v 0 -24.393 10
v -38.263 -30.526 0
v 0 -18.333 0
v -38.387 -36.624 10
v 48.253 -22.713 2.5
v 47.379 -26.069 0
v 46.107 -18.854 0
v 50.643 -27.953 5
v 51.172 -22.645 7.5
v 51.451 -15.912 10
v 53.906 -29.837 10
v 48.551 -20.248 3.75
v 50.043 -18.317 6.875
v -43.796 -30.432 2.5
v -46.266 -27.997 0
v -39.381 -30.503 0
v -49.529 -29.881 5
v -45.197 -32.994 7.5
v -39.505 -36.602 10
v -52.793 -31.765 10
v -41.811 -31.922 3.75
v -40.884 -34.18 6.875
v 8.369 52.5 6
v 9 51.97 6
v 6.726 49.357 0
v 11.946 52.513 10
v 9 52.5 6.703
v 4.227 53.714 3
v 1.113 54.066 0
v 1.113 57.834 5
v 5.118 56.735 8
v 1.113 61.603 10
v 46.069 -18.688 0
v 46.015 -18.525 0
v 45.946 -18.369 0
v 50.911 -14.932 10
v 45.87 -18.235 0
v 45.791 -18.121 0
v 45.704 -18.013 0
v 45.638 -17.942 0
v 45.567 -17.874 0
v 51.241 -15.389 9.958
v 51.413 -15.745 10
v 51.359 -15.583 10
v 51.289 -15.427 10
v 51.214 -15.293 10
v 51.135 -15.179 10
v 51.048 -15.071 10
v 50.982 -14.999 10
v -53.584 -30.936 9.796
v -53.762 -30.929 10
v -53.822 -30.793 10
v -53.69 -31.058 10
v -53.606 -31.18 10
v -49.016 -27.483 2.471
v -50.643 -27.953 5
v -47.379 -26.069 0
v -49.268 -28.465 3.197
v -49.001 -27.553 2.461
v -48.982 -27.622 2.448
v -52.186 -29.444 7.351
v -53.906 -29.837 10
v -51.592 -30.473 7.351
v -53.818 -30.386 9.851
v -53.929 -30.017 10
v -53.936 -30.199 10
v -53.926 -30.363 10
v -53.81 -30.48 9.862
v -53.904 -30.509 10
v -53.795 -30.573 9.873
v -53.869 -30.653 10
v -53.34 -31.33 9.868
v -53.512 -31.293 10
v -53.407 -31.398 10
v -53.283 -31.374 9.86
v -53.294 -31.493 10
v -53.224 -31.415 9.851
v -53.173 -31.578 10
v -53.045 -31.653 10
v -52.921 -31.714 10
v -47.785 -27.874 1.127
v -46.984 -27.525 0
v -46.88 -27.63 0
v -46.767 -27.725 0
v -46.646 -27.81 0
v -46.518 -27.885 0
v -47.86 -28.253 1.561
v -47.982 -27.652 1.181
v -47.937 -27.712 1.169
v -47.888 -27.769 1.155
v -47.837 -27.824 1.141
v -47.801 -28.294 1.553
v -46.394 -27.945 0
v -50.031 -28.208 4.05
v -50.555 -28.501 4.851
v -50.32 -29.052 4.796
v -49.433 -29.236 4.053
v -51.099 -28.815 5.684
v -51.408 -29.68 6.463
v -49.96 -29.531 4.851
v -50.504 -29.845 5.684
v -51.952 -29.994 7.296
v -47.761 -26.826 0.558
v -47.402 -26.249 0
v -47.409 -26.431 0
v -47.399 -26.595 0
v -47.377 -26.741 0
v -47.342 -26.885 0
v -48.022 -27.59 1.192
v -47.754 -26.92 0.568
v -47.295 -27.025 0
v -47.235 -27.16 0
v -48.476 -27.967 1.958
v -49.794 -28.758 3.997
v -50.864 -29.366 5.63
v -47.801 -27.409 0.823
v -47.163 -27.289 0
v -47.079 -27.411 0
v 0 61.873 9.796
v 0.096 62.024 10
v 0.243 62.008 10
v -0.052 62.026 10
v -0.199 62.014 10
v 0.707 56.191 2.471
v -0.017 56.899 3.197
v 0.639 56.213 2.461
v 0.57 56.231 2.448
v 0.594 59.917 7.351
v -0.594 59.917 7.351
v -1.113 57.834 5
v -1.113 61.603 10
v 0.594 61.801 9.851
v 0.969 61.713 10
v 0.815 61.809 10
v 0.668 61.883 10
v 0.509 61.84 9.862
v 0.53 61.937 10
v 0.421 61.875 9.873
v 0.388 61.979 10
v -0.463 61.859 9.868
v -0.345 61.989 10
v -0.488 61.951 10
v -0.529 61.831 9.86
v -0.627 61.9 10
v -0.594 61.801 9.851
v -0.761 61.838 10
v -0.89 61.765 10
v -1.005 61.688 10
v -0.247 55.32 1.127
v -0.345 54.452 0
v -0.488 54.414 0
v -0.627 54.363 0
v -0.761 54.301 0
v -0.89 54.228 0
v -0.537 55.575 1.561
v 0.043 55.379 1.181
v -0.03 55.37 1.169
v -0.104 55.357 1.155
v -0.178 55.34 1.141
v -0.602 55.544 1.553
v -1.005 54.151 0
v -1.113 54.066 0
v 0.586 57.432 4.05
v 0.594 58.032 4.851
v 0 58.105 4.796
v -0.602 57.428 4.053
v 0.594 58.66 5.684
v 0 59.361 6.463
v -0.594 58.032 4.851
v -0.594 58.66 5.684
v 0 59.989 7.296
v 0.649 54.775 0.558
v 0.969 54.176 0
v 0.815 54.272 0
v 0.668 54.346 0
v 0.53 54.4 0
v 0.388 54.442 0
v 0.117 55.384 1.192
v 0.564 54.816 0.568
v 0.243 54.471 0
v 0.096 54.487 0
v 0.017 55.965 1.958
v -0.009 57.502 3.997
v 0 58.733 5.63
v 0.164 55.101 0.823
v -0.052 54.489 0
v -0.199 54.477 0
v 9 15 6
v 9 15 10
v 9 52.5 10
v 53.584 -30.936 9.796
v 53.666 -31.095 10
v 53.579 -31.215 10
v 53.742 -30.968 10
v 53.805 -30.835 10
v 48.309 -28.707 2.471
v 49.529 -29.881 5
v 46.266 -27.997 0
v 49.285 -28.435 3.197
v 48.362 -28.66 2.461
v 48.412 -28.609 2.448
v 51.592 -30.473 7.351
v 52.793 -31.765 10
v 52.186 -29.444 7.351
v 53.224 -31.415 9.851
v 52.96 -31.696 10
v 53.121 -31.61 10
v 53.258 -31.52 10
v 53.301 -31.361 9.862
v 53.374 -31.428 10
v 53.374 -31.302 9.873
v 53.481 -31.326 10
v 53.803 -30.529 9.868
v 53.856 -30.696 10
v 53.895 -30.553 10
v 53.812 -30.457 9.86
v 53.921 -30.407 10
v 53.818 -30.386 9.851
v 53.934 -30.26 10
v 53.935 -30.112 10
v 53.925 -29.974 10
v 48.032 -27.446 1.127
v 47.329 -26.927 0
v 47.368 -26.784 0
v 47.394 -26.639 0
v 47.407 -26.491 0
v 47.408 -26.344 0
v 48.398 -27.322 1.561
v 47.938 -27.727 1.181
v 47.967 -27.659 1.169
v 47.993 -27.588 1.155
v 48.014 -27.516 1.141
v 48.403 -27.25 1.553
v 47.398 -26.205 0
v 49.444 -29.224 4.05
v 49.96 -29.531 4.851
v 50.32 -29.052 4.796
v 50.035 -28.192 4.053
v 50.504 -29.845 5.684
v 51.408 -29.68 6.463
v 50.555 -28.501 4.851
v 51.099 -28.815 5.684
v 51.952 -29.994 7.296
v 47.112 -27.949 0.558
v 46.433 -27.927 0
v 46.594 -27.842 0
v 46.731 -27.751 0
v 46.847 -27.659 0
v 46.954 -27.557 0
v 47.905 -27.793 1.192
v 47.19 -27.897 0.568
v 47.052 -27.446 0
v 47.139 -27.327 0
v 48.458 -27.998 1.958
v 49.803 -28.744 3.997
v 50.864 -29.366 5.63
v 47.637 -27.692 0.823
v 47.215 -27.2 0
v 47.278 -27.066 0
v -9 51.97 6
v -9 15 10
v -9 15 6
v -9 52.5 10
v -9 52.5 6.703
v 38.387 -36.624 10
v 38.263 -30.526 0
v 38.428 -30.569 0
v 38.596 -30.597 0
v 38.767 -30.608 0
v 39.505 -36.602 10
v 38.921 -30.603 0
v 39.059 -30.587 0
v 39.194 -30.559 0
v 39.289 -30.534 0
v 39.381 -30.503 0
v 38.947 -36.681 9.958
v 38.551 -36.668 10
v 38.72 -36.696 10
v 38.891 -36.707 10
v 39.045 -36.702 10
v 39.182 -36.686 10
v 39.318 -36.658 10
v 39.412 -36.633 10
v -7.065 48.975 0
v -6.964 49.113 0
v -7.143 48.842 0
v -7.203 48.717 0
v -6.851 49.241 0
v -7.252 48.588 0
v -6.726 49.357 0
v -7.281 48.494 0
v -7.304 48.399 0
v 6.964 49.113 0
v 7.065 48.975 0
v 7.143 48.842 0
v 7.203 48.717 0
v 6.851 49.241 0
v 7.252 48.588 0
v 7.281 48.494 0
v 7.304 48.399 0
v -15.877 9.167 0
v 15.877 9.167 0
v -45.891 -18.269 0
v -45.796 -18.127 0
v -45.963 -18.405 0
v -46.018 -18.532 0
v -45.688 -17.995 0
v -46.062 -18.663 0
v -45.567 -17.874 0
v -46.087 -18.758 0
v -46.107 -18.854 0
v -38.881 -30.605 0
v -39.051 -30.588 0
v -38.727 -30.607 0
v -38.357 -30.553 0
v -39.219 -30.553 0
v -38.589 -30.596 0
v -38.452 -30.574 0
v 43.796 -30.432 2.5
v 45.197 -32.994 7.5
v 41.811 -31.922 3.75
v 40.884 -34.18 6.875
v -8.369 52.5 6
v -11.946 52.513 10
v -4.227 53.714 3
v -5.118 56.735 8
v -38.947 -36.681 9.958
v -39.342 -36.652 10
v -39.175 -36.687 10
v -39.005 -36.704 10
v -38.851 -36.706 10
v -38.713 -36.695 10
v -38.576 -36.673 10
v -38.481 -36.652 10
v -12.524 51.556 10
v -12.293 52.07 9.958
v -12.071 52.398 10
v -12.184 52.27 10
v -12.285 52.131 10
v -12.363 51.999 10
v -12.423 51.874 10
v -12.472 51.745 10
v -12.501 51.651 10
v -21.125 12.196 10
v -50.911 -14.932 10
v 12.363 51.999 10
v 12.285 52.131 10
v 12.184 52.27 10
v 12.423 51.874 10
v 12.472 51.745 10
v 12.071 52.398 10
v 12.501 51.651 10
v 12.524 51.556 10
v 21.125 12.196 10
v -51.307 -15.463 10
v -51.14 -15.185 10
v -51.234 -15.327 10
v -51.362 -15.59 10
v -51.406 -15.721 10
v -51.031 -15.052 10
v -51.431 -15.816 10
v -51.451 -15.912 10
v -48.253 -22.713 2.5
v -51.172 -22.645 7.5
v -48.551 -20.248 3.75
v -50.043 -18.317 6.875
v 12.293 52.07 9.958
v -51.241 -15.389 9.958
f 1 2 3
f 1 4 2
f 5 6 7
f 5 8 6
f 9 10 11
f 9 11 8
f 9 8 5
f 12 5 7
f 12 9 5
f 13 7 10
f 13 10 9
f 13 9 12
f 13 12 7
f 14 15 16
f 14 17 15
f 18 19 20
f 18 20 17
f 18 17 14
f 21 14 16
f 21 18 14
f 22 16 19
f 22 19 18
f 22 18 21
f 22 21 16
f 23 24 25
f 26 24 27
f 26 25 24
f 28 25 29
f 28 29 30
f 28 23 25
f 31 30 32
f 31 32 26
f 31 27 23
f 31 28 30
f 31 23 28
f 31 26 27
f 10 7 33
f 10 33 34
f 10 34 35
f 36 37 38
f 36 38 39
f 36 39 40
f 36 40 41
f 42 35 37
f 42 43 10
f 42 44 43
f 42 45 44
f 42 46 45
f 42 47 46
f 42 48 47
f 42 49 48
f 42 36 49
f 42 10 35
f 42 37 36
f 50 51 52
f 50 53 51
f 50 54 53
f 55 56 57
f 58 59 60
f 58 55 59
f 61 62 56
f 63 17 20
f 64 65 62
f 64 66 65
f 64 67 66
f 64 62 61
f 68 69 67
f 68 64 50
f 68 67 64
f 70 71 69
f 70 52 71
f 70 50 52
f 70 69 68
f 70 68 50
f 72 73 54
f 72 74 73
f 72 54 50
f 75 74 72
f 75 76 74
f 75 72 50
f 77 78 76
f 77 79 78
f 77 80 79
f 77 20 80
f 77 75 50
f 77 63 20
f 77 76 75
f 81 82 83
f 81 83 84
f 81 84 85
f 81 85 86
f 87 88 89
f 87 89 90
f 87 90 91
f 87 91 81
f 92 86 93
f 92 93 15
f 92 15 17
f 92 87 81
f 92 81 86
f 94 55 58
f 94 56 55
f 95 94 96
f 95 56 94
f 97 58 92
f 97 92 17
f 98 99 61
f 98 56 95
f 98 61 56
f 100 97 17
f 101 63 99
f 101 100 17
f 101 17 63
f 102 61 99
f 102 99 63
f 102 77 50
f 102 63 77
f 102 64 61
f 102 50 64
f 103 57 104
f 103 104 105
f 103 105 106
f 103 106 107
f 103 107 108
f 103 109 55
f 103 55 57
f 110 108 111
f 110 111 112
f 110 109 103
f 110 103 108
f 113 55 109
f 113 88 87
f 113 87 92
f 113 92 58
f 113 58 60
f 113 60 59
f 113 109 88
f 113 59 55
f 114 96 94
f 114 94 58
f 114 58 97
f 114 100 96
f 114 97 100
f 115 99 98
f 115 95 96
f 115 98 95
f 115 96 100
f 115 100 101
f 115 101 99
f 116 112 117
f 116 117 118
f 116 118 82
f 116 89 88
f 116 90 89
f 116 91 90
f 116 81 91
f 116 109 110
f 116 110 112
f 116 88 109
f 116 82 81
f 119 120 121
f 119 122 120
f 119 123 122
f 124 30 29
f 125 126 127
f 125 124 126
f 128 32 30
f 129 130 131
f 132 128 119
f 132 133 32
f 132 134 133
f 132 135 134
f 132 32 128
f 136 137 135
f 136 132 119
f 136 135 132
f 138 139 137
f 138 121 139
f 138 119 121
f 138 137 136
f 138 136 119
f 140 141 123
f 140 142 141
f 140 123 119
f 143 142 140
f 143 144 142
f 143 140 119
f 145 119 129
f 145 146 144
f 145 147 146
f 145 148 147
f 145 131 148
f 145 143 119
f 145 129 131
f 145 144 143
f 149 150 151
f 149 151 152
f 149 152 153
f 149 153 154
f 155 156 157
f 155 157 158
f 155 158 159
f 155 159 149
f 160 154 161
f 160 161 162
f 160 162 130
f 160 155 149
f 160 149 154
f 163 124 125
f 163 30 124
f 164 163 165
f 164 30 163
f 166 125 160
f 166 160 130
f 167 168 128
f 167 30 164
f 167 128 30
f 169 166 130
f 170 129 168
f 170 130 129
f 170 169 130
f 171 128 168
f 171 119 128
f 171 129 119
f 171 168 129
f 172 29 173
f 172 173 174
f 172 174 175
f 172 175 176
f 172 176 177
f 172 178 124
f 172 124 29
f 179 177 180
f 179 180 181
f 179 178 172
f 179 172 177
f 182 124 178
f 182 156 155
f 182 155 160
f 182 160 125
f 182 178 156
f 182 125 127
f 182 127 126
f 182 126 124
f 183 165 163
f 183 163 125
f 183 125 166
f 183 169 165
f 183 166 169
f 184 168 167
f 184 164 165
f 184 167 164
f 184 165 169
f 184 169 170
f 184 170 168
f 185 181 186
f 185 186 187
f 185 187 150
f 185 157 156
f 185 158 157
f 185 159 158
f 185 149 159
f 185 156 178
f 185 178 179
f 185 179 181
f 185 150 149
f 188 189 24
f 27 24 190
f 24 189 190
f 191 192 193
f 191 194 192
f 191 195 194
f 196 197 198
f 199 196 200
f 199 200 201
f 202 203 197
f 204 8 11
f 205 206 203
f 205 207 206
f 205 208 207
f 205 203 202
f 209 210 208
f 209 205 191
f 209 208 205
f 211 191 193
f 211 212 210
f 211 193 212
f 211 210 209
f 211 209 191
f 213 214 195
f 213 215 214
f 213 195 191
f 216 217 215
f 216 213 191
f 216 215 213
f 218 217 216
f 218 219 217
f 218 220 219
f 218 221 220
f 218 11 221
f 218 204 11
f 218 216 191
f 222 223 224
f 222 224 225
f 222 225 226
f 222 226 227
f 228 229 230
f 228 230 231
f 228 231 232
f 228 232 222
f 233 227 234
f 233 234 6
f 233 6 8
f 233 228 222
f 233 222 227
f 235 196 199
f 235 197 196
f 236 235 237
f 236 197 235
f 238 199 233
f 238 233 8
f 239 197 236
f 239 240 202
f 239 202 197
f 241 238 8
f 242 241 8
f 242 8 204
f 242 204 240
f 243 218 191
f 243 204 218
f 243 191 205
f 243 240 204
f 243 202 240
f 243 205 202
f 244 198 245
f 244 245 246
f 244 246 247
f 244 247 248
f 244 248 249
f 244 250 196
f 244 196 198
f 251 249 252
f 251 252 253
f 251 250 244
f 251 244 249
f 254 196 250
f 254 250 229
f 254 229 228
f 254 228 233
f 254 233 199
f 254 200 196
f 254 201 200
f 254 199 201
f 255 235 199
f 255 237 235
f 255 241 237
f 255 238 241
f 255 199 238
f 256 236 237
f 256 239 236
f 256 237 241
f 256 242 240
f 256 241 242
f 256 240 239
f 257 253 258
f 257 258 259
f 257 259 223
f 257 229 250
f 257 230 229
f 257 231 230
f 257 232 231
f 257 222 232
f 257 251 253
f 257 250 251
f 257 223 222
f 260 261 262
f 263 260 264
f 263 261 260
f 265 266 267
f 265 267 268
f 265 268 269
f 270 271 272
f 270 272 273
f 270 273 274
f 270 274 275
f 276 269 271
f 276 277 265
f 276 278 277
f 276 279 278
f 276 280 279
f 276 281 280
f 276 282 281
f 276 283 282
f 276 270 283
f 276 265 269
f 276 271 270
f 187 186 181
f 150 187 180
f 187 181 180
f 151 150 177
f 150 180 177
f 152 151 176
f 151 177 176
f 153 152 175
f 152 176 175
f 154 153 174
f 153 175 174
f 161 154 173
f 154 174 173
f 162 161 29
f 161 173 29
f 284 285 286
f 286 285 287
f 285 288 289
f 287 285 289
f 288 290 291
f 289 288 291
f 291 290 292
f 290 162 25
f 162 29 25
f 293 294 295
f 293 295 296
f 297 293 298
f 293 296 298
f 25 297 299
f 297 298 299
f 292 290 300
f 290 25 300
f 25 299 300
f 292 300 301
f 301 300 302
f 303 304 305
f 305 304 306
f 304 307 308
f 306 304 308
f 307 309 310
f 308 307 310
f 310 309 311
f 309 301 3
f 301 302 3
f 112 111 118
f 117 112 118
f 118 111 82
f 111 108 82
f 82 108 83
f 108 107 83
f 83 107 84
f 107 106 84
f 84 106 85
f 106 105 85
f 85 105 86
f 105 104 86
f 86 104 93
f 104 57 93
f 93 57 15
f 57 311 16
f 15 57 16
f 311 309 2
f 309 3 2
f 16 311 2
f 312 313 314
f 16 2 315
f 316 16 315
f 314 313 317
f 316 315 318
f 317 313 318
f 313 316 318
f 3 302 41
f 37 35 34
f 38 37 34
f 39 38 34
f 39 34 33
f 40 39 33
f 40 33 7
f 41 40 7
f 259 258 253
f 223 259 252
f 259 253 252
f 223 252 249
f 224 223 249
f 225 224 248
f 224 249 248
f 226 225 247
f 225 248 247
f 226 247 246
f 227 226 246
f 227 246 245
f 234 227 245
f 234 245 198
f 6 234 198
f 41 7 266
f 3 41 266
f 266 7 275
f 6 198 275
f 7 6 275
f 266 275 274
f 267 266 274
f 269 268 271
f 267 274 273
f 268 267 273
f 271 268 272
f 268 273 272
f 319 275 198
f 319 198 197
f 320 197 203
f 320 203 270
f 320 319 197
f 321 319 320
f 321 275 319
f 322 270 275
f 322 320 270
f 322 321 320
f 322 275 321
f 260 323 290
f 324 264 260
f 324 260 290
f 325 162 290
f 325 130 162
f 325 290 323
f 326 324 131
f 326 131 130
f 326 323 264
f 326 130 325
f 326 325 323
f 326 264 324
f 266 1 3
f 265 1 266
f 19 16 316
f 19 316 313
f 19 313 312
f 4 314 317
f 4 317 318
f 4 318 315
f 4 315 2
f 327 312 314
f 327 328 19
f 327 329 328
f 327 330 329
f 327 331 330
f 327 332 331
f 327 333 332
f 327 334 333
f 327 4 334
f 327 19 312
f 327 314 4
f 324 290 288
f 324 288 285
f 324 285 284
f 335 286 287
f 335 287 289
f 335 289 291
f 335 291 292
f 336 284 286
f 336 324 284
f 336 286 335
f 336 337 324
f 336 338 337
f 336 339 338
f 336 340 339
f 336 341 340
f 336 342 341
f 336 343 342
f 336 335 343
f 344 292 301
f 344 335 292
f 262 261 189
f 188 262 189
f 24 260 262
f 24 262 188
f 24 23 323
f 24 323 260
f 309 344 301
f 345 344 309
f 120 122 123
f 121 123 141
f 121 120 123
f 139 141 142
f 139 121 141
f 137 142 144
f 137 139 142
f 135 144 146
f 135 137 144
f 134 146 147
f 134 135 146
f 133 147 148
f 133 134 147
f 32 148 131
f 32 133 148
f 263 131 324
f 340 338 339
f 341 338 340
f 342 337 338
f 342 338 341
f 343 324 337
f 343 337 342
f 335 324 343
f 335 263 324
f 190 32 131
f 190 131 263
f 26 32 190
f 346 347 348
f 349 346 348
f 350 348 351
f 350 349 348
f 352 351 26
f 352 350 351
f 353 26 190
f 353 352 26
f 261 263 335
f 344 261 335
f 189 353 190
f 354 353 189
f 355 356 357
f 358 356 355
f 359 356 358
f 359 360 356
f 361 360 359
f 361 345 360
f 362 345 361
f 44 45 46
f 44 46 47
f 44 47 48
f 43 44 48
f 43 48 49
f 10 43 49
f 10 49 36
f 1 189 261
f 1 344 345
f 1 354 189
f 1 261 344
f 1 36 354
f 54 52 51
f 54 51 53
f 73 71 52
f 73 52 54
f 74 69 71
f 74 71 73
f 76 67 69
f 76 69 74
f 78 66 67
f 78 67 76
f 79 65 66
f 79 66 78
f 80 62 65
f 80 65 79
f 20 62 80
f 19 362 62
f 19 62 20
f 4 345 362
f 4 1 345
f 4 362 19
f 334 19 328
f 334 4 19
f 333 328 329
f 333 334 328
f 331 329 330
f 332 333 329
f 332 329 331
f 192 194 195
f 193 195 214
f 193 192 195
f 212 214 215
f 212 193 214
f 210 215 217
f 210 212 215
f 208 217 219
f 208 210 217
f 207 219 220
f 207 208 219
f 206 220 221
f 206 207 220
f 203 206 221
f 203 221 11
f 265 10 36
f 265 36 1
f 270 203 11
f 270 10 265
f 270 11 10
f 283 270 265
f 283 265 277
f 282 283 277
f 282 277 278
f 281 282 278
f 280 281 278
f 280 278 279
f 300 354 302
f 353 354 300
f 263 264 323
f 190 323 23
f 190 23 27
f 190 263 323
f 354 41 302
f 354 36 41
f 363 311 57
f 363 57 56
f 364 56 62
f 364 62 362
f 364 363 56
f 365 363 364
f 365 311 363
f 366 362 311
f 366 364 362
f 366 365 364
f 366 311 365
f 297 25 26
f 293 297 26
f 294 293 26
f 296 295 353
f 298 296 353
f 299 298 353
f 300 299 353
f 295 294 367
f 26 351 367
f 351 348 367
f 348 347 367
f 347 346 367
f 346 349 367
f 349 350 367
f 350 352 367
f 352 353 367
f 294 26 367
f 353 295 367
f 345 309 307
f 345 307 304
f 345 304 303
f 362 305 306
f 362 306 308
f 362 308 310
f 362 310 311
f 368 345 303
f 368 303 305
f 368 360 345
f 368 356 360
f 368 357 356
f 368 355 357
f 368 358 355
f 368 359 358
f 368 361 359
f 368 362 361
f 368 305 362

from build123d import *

# Parameters (mm, degrees)
F0_R     = 10
F1_DEPTH = 10
F1_TAPER = -30
F2_R     = 2
F3_W     = 18
F3_H     = 37.5
F4_DEPTH = 4


with BuildPart() as f1:
    # F0 (on Top) → F1 (new body)
    with BuildSketch(Plane.XY):
        Polygon((7.1782154391, 48.9767620725), (0, 55), (-7.1782154391, 48.9767620725), (-15.8771324027, 9.1666666667), (-46.0042278695, -18.2718641122), (-47.6313972081, -27.5), (-38.8260124304, -30.7048979604), (0, -18.3333333333), (38.8260124304, -30.7048979604), (47.6313972081, -27.5), (46.0042278695, -18.2718641122), (15.8771324027, 9.1666666667), align=None)
        Circle(F0_R, mode=Mode.SUBTRACT)
        Circle(F0_R)
    extrude(amount=F1_DEPTH, taper=F1_TAPER)

    # F2
    f2_edges = [f1.edges().sort_by_distance(p)[0] for p in [
        (0, 58.768386, 5),
        (9.788193, 50.555117, 5),
        (-9.788193, 50.555117, 5),
        (48.676112, -16.800735, 5),
        (50.894915, -29.384193, 5),
        (38.887919, -33.754382, 5),
        (-48.676112, -16.800735, 5),
        (-50.894915, -29.384193, 5),
        (-38.887919, -33.754382, 5),
    ]]
    fillet(f2_edges, radius=F2_R)

    # F3 (on face) → F4 (cut)
    with BuildSketch(Plane.XY.offset(10)):
        with Locations((0, 33.75)):
            Rectangle(F3_W, F3_H)
    extrude(amount=-F4_DEPTH, mode=Mode.SUBTRACT)


solid = f1.part
